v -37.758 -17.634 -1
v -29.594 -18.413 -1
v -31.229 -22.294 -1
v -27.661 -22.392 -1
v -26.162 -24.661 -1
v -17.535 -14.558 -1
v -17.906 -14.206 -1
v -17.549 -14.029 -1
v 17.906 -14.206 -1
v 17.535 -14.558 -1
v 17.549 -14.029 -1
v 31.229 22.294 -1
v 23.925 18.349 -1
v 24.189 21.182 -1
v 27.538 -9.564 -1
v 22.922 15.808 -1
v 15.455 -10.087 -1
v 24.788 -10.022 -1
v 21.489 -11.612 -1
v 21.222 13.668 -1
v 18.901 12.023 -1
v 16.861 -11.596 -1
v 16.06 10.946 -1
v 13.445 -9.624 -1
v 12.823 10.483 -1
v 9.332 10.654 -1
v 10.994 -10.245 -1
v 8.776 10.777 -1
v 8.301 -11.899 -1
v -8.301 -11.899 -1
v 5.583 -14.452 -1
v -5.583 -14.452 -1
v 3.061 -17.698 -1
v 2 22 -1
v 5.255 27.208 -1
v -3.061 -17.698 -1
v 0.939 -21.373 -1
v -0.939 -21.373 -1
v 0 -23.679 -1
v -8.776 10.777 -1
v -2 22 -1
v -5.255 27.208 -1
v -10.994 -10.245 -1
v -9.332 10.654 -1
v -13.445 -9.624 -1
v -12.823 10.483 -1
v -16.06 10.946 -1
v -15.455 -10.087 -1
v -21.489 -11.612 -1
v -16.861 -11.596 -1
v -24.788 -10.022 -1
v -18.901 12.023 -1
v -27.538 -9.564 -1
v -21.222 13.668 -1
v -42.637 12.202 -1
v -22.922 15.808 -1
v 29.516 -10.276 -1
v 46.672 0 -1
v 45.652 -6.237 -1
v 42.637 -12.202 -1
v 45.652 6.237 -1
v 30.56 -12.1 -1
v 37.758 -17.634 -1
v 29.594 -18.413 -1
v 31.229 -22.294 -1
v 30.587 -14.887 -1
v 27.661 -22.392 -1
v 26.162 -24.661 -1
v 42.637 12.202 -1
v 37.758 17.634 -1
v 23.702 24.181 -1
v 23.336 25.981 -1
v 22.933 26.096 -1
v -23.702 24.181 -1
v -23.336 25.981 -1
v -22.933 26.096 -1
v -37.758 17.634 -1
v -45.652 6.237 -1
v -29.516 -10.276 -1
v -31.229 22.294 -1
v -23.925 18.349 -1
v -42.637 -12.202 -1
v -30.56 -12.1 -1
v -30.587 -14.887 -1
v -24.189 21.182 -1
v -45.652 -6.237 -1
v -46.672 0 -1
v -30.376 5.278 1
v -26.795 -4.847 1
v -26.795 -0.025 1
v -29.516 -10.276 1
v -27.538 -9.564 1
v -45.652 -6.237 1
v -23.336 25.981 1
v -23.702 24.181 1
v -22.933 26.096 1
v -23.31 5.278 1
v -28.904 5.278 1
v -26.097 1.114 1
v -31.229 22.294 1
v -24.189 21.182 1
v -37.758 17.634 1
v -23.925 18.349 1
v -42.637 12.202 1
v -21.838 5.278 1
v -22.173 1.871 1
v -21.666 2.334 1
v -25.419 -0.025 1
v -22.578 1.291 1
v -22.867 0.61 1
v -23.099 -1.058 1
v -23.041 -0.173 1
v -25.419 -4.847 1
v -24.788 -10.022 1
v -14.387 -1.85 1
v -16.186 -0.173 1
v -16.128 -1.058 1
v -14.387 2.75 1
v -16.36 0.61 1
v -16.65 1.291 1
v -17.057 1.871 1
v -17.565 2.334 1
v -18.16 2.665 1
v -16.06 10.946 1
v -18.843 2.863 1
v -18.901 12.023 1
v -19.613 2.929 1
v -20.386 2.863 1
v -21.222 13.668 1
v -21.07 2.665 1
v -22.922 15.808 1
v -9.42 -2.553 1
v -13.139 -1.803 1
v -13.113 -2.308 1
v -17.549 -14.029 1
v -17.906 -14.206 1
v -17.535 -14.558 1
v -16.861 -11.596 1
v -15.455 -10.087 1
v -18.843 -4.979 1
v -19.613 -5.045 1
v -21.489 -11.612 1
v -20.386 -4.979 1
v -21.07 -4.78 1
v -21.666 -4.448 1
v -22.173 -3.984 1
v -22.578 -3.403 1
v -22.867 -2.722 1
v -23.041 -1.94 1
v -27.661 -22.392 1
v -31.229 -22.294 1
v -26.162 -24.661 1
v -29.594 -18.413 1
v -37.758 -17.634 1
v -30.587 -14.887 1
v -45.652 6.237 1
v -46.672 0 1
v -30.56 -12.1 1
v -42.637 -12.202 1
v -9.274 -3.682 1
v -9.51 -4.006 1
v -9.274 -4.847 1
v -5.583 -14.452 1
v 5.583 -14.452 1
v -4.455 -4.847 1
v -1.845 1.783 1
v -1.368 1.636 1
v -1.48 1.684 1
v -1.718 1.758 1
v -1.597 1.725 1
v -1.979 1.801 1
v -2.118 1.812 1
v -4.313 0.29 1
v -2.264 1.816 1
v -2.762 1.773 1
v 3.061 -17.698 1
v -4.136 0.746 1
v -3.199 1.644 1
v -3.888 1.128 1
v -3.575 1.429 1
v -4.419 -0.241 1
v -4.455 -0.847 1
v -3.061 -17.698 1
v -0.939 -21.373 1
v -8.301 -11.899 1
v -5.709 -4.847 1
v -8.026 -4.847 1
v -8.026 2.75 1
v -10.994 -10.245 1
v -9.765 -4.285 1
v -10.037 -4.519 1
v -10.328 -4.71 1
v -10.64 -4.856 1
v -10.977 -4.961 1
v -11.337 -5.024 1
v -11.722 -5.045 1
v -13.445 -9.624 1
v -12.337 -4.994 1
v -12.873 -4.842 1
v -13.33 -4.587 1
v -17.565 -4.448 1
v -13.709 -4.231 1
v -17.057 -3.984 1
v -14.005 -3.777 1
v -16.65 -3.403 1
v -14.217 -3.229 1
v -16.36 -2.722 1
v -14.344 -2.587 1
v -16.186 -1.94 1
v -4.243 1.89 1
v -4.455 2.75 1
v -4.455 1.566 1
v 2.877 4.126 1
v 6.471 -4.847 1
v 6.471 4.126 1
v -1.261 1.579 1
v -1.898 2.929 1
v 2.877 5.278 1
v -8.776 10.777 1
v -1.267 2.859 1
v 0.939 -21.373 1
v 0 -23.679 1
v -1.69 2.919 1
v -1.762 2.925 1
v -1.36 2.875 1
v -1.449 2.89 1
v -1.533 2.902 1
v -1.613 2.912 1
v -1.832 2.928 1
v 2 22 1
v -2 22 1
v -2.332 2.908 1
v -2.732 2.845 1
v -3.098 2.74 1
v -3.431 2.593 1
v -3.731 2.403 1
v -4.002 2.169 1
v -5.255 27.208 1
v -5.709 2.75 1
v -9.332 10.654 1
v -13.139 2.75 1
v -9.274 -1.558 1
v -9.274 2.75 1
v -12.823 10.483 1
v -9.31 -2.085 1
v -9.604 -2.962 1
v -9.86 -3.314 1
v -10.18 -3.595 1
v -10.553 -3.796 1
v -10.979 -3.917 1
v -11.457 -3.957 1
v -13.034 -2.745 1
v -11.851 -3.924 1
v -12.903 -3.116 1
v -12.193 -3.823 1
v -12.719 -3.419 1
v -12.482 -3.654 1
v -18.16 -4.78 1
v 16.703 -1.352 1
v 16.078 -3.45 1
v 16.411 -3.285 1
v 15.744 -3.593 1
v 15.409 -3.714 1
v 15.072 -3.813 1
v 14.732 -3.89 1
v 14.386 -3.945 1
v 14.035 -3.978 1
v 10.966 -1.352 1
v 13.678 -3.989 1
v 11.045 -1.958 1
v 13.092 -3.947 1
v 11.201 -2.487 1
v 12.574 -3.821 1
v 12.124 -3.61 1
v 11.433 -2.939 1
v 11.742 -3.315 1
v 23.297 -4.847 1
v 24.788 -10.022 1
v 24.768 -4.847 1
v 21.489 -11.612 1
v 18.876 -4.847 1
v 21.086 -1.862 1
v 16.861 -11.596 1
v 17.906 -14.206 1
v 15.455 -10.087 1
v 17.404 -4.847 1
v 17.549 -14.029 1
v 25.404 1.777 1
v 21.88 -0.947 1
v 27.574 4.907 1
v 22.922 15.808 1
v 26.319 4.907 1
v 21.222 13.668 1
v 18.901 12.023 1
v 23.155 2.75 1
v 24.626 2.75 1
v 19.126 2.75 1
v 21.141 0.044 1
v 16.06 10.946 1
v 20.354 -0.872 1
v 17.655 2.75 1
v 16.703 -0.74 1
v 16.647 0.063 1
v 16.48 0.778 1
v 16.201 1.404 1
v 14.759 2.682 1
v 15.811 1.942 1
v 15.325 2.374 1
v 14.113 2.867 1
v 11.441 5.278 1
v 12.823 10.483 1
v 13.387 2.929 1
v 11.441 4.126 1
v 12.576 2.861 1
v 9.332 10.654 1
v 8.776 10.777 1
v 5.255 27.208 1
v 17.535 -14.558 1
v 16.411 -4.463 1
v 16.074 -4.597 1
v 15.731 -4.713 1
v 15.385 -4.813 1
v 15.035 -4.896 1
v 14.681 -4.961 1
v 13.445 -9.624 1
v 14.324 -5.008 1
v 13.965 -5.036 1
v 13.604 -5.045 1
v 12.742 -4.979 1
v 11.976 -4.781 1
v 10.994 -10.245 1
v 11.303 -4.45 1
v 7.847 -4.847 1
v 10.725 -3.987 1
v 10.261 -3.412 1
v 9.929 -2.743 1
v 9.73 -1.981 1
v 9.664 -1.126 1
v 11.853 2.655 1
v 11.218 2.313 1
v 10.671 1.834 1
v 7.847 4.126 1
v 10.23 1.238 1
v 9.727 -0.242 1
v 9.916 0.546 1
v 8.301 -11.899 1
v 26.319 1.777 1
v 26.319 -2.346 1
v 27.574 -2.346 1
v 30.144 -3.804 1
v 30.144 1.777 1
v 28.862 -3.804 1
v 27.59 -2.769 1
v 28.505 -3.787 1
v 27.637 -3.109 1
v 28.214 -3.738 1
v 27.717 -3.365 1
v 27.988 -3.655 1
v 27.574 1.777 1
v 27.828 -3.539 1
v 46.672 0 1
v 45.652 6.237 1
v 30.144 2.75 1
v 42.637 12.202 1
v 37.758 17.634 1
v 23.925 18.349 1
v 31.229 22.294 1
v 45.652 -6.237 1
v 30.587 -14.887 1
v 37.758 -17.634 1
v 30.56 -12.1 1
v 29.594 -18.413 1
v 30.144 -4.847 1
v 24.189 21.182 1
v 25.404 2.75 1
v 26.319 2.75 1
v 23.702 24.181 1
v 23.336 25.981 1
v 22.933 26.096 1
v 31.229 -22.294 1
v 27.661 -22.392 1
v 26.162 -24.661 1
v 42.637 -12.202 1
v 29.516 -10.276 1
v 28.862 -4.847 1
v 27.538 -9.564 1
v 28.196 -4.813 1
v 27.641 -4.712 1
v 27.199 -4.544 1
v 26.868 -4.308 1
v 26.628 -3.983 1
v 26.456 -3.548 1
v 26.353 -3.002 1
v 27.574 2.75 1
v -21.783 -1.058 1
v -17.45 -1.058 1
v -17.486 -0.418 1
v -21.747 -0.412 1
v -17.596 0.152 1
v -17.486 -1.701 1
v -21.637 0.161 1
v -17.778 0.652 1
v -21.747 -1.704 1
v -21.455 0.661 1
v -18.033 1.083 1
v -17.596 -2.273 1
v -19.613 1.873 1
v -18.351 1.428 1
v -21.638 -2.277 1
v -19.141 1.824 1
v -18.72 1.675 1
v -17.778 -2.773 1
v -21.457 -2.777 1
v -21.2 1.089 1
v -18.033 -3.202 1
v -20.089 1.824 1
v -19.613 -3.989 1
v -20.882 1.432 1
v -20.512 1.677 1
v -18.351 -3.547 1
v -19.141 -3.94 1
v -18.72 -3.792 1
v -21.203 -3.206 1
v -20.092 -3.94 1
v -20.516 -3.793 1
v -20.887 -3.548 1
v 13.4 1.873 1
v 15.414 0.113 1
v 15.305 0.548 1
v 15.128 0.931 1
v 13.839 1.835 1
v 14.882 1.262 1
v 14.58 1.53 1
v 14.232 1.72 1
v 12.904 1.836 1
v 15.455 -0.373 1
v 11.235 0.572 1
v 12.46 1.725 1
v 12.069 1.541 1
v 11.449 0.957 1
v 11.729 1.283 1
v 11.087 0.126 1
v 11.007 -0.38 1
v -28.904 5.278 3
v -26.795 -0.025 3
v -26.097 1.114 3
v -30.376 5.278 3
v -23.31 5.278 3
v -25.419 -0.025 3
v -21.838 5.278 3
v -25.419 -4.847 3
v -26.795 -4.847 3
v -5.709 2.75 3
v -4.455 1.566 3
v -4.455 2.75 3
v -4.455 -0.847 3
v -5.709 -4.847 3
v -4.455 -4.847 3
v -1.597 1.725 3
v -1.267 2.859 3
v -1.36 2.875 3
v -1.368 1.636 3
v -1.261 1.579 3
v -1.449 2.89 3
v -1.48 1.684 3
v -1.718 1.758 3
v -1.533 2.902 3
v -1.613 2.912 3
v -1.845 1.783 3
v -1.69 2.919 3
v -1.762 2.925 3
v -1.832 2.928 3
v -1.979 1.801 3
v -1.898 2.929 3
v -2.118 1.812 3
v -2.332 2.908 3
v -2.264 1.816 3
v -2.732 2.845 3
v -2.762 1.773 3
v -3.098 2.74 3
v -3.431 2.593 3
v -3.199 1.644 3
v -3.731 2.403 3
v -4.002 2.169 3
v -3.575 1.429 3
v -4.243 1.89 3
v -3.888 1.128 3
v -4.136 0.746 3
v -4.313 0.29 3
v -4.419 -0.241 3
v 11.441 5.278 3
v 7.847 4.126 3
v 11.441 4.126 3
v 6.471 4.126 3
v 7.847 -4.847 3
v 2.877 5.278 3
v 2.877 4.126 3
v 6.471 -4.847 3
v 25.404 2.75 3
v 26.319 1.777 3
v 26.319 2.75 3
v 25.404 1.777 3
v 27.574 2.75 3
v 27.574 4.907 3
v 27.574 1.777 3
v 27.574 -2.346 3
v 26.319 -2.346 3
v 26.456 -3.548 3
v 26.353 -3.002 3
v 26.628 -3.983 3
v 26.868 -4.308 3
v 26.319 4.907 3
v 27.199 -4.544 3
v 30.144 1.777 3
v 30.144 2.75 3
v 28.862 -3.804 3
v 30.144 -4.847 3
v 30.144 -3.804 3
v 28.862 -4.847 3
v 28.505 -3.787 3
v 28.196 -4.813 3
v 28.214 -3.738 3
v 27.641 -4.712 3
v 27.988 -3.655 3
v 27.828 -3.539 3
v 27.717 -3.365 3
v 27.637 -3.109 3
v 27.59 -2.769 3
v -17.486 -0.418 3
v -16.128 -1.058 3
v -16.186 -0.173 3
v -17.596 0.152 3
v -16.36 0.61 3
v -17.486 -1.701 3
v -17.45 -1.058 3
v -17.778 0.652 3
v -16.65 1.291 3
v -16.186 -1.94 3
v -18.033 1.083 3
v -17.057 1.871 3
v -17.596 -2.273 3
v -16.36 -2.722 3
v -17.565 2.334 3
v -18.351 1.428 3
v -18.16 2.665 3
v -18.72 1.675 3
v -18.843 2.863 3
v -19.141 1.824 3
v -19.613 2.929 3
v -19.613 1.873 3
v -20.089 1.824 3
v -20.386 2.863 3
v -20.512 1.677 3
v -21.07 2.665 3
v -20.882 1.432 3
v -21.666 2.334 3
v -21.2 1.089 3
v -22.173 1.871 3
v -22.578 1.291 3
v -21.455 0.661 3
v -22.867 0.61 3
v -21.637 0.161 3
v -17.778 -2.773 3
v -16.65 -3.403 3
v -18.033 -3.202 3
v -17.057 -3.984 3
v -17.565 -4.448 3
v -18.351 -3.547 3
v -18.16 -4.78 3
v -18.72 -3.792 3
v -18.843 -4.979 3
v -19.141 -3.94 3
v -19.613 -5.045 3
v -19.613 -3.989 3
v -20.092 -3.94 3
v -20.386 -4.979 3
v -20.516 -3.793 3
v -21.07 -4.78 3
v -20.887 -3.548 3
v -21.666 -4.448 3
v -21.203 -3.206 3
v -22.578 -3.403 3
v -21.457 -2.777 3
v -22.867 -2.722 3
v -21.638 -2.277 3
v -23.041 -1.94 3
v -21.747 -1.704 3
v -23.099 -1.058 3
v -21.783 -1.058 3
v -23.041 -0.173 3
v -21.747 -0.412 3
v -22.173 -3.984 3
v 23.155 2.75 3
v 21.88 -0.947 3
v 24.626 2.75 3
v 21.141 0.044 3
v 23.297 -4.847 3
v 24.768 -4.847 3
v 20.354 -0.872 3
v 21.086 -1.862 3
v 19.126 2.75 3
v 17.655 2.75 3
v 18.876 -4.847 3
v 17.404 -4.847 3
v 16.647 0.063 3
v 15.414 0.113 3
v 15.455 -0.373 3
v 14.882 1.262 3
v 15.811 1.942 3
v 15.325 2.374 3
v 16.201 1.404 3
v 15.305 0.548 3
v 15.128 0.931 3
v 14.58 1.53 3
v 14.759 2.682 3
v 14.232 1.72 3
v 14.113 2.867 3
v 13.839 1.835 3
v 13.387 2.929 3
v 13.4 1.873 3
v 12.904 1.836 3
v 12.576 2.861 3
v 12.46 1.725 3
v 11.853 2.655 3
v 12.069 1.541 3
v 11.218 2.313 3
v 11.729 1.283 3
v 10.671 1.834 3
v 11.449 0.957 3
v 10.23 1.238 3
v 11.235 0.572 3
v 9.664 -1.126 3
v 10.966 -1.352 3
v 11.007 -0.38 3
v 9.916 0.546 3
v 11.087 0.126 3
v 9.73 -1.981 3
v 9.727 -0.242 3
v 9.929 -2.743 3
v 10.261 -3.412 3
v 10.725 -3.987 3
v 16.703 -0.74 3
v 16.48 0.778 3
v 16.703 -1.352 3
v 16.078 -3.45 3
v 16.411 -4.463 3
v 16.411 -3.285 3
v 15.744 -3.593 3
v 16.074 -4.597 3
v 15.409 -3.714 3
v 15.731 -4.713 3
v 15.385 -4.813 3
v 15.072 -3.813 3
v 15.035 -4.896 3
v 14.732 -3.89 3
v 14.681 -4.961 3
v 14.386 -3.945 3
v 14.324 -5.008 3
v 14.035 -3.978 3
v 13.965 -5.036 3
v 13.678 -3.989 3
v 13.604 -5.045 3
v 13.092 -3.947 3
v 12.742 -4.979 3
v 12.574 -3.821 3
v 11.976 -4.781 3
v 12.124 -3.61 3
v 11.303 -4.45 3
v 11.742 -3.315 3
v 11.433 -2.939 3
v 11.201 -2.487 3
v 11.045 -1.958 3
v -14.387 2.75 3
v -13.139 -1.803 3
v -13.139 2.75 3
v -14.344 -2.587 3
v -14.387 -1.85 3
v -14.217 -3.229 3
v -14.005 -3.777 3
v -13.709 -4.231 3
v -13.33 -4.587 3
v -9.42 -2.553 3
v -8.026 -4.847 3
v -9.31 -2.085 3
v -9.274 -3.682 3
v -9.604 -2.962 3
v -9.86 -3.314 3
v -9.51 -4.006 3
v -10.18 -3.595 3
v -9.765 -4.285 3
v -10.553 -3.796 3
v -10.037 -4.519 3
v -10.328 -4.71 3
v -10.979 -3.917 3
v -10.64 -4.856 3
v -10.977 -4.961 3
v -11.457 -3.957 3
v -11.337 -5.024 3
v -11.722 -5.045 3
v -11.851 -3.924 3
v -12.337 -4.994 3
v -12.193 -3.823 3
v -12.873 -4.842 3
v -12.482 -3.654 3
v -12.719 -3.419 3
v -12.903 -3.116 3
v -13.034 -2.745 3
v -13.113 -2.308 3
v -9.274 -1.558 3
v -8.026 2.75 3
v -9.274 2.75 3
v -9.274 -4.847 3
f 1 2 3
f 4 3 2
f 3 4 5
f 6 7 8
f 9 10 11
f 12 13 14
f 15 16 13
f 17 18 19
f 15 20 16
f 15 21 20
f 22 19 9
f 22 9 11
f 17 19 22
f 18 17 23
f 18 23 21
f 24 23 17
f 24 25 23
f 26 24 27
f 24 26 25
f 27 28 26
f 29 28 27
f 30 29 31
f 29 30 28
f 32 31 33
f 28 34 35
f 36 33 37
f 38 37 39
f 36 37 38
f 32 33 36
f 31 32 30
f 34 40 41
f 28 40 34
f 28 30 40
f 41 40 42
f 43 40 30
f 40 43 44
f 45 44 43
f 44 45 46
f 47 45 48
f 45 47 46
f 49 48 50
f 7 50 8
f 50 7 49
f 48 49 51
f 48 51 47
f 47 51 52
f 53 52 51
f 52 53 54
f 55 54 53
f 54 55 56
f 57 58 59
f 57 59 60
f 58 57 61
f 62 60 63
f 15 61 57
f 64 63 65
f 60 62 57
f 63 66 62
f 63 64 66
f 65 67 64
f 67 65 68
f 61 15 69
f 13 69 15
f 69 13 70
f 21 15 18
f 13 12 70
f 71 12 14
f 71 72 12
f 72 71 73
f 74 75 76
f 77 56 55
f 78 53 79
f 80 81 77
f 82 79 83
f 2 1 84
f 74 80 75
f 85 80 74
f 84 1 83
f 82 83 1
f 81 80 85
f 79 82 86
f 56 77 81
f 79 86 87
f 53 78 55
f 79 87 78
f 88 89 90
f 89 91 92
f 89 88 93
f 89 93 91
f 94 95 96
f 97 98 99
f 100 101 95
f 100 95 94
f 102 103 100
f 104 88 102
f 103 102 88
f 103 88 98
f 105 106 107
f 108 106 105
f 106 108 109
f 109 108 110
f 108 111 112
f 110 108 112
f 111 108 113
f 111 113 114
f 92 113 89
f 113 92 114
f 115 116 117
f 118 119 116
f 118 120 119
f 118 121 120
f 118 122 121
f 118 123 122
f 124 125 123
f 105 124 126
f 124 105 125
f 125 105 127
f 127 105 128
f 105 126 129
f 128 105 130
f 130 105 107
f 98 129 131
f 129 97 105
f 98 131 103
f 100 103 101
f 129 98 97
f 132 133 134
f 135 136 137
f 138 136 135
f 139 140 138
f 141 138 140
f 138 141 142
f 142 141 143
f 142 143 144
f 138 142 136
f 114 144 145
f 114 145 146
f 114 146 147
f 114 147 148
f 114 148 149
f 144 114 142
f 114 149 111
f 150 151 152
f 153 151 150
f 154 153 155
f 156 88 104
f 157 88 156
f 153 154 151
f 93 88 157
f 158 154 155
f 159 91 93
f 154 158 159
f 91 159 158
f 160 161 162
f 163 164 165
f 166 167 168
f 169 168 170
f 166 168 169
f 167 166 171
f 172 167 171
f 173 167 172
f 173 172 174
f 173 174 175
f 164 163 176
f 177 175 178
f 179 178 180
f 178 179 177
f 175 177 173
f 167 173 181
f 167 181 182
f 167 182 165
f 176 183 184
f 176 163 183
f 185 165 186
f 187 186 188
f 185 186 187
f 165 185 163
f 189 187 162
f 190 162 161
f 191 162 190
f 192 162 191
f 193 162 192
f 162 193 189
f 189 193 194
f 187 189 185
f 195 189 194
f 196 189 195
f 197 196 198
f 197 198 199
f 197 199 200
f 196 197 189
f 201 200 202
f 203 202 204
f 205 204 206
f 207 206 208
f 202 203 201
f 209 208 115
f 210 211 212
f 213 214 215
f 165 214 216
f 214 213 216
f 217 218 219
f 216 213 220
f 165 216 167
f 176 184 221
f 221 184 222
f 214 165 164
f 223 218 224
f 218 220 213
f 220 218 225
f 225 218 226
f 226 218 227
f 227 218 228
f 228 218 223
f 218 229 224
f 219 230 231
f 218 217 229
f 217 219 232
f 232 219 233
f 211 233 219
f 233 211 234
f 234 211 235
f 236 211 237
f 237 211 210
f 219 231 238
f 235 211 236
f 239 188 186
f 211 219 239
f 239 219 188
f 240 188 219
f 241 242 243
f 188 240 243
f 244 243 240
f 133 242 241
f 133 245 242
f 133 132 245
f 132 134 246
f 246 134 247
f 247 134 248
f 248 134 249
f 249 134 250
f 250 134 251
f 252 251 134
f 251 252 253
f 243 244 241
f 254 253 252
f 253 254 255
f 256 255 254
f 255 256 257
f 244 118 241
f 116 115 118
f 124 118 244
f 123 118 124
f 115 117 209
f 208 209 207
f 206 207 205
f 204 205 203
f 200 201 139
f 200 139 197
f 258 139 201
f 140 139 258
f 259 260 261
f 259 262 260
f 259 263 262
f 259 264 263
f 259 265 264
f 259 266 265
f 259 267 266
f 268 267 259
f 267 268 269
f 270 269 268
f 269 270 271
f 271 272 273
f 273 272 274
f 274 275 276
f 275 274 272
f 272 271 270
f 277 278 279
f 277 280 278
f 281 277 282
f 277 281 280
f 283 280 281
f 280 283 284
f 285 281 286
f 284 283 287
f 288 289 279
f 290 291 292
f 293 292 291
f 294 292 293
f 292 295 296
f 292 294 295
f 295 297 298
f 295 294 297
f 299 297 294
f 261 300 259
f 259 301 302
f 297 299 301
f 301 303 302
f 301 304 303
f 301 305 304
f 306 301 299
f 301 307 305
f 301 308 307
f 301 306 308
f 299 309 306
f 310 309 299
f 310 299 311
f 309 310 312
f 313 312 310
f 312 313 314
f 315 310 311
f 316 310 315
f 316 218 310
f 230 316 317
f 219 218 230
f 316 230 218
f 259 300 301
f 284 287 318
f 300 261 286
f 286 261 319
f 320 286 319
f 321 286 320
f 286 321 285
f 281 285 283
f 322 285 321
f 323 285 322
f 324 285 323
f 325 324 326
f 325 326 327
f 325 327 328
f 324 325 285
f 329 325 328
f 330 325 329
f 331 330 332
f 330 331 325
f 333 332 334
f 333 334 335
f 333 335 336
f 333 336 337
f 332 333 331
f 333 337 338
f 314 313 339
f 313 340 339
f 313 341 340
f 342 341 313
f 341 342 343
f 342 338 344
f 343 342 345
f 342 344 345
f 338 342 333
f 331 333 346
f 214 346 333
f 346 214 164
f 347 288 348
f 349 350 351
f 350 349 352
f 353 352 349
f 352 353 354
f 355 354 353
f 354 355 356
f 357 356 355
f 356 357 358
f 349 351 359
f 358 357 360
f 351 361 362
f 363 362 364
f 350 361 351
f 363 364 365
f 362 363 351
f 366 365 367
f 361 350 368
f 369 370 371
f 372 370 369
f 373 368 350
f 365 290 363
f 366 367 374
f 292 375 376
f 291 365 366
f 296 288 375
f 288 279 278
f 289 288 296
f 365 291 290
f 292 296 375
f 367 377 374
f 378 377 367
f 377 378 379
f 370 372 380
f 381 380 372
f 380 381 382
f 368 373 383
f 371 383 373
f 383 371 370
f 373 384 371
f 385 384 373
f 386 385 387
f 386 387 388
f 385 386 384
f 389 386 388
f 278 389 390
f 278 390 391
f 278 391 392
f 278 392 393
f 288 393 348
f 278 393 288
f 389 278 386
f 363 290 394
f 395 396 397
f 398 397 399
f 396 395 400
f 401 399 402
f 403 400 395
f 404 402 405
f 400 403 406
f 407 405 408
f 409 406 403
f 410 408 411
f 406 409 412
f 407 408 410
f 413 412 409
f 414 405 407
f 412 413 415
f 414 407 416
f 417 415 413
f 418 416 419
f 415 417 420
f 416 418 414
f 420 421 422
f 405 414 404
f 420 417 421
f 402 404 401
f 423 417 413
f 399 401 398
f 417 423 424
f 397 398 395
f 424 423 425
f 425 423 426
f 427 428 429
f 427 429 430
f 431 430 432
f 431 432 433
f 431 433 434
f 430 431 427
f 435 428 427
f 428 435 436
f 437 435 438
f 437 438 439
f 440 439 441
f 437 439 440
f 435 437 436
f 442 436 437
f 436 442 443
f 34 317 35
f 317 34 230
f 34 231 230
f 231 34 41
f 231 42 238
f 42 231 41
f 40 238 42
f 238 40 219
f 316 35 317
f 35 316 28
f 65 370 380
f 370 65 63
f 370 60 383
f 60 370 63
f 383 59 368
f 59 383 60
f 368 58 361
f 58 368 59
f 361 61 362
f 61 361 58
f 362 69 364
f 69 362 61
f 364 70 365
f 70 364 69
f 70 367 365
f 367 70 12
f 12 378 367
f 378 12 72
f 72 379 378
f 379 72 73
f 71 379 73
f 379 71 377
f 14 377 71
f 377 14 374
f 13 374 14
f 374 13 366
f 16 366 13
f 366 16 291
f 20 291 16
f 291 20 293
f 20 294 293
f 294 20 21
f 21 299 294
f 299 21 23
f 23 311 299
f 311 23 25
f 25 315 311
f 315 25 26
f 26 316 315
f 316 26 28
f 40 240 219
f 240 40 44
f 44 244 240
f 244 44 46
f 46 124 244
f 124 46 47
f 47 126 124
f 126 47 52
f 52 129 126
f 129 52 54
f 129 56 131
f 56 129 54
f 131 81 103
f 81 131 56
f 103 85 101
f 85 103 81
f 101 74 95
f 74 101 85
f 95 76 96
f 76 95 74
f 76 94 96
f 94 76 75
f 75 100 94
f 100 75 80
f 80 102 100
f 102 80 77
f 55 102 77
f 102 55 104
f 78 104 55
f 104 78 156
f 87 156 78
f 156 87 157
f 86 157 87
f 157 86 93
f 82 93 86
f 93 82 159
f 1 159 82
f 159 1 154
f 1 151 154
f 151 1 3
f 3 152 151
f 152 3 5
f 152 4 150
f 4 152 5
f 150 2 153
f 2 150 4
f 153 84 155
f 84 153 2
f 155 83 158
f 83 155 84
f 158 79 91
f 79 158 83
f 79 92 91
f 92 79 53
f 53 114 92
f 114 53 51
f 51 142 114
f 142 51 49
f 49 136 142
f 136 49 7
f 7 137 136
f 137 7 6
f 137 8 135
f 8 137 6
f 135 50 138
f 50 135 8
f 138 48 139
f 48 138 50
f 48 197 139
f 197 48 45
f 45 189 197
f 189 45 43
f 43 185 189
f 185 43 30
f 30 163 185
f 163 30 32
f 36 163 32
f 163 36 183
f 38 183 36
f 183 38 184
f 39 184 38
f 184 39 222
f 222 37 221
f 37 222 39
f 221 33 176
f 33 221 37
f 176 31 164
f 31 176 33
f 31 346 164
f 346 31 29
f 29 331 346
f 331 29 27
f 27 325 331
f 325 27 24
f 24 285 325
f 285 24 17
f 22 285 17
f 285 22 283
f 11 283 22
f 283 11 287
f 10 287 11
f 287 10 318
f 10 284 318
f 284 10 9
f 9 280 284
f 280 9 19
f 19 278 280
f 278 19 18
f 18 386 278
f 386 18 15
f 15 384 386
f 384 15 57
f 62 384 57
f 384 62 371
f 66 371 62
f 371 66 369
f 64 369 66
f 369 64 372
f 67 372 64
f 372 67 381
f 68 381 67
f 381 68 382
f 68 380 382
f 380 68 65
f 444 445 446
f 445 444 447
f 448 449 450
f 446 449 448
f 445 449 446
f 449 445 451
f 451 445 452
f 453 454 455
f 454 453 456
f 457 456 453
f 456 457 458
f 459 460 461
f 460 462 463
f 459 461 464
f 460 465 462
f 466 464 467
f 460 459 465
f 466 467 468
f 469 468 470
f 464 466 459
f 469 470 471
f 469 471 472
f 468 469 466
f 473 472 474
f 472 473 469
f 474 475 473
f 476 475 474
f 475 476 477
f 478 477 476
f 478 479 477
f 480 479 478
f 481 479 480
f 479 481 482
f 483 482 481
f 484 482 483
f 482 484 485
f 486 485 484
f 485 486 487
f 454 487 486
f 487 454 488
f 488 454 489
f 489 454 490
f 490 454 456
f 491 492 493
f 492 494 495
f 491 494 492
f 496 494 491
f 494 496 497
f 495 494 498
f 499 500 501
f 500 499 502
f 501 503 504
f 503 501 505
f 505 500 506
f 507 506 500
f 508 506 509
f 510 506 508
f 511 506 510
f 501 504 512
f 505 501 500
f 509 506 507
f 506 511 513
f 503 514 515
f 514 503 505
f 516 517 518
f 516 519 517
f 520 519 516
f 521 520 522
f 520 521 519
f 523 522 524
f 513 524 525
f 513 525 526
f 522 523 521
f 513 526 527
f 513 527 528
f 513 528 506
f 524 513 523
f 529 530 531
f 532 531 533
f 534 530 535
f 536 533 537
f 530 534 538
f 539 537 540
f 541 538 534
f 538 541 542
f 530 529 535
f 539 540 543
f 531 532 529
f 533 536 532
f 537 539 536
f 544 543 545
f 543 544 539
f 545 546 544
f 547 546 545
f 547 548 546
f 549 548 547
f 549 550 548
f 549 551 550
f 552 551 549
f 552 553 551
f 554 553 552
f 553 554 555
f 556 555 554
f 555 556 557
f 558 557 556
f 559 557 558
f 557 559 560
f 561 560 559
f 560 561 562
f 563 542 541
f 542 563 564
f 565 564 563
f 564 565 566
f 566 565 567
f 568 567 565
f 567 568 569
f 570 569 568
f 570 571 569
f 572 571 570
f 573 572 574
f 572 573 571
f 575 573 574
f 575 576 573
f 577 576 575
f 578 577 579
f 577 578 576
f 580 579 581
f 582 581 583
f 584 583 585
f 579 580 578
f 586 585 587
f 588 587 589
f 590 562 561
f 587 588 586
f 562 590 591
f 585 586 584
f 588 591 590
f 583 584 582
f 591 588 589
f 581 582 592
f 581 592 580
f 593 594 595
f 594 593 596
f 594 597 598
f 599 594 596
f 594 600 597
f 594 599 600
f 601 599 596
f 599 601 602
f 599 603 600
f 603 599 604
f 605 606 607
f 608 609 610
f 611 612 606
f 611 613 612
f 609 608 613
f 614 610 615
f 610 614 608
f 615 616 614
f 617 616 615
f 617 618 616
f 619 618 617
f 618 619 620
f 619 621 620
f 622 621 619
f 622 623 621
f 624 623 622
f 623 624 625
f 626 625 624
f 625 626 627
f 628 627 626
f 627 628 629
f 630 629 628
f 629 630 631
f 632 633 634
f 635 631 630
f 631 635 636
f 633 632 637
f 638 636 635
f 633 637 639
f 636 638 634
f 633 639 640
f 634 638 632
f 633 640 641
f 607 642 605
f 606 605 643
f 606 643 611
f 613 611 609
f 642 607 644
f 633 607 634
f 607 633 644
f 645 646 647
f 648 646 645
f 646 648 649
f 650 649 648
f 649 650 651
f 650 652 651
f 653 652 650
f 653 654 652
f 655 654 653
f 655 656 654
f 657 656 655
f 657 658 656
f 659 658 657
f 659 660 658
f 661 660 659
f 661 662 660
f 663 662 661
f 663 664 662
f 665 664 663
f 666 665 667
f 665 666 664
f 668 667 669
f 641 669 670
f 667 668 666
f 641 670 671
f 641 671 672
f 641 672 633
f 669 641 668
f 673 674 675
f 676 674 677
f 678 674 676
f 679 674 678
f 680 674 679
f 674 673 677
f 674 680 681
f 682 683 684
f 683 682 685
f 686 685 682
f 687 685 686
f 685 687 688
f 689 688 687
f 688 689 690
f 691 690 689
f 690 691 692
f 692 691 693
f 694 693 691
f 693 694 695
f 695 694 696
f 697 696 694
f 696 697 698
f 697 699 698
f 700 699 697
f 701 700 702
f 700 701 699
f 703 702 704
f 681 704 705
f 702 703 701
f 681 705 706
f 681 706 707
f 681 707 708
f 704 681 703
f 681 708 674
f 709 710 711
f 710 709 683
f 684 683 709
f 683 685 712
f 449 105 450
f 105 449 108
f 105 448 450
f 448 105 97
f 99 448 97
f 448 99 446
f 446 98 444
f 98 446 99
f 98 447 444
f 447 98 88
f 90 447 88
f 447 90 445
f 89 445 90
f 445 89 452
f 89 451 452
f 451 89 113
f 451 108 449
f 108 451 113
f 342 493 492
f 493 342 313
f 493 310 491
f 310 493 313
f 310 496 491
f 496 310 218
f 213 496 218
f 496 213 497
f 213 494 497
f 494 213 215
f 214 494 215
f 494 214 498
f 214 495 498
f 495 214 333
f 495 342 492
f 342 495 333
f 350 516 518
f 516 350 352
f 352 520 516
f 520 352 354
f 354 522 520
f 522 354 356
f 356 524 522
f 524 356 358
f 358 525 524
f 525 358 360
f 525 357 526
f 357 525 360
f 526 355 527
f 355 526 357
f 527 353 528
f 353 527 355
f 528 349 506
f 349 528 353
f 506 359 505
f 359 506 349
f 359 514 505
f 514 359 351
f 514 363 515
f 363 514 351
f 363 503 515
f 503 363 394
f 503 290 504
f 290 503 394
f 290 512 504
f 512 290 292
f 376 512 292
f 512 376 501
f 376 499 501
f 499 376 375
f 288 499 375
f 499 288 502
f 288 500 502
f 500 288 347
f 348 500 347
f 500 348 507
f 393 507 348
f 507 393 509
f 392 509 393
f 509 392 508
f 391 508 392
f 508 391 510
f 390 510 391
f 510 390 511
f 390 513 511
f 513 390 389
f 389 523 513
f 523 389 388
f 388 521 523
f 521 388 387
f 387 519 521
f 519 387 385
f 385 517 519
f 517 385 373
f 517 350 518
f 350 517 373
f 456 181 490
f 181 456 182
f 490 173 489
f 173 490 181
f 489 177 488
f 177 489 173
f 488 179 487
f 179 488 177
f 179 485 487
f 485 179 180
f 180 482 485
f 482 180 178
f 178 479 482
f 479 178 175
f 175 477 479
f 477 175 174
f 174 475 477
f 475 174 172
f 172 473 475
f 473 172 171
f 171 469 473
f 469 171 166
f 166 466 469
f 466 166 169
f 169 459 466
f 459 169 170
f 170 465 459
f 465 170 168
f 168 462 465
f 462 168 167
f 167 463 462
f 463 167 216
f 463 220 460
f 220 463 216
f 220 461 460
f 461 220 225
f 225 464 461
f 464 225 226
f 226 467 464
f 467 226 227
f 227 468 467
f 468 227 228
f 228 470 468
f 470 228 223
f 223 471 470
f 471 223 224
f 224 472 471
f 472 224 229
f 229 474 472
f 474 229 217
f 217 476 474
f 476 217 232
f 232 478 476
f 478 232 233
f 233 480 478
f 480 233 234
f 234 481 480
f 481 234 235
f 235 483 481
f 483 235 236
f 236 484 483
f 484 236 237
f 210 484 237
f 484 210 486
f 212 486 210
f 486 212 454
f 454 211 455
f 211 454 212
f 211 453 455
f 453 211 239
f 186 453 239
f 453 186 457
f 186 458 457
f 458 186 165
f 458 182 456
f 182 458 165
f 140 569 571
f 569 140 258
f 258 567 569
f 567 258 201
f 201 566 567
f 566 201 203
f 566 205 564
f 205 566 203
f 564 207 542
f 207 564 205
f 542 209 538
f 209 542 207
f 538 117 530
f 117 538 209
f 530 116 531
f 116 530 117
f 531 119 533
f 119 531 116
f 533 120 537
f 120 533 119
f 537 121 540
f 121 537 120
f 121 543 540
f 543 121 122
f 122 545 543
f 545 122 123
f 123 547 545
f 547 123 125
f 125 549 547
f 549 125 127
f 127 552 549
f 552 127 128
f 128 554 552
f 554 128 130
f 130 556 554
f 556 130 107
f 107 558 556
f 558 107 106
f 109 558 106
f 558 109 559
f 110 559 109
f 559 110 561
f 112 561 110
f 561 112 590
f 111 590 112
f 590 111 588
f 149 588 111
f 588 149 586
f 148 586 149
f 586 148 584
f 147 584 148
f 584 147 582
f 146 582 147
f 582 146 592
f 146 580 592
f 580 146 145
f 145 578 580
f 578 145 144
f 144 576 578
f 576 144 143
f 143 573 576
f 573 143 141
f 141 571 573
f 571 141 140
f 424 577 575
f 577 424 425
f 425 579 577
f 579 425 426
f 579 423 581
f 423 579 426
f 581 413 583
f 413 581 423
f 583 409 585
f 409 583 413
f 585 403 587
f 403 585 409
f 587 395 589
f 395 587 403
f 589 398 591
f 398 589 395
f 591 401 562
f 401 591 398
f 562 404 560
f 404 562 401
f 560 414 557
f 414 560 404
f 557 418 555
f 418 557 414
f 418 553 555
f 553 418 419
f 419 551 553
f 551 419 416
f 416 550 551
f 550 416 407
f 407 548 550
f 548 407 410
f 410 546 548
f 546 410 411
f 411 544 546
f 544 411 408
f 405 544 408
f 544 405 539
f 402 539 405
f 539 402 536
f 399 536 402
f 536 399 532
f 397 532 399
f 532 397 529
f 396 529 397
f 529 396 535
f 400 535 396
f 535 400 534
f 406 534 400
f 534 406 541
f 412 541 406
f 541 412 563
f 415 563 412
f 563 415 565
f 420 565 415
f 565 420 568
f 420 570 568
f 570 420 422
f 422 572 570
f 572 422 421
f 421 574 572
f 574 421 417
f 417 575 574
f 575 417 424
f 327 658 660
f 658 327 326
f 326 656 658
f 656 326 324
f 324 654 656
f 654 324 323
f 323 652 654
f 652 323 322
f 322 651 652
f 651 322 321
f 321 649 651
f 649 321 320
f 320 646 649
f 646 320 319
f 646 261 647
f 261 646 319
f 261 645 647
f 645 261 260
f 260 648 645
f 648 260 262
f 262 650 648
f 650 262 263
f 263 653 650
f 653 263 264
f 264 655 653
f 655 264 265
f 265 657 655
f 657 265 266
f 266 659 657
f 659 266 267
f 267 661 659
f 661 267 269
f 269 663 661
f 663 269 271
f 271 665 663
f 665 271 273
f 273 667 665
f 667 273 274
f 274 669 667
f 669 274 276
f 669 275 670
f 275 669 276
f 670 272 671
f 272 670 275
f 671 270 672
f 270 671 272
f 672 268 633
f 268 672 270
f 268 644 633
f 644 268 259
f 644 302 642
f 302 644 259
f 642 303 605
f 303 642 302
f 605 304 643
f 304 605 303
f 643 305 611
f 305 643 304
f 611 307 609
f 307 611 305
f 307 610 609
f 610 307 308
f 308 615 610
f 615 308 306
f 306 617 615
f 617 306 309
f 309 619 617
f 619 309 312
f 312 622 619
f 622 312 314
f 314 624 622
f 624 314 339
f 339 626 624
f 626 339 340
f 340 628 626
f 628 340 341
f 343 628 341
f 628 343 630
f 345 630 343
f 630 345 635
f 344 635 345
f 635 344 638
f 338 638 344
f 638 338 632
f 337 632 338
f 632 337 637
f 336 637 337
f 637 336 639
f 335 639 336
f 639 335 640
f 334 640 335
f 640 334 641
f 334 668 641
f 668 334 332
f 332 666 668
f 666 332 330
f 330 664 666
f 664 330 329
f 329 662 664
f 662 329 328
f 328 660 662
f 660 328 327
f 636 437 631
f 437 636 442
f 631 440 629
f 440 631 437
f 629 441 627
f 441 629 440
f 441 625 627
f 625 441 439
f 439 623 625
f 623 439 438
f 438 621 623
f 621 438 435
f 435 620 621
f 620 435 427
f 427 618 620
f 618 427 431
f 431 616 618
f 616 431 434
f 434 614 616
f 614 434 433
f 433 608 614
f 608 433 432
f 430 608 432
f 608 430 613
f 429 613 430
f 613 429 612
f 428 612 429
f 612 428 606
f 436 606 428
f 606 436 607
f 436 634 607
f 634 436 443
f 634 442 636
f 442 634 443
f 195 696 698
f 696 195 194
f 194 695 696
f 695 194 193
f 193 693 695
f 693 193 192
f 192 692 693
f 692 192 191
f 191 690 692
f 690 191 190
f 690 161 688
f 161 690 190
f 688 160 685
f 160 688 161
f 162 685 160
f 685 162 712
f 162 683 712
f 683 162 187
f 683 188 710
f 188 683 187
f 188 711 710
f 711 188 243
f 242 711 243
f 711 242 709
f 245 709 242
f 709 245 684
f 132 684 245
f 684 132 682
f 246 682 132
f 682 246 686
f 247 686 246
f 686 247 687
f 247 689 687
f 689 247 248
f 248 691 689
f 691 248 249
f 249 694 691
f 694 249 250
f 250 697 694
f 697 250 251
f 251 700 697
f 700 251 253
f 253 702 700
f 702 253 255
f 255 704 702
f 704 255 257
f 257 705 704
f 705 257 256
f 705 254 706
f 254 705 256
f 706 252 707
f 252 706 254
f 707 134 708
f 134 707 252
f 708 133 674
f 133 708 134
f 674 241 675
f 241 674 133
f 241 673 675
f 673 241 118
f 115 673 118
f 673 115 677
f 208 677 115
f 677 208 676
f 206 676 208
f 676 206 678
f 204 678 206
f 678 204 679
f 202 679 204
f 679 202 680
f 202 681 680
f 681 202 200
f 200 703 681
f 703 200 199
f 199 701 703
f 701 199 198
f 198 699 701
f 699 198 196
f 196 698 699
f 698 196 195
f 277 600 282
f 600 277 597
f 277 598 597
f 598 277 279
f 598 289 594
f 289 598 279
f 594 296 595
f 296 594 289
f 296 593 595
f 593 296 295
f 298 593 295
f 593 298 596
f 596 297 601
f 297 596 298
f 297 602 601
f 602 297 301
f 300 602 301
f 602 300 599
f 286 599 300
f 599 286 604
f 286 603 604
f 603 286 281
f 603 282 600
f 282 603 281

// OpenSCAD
/* [Text] */
//height above base
textHeight = 3; // [1,2,3,4,5]
//text size
textSize = 10; // [3:35] 
// font for text
myFont = "Bernard MT Condensed";
//text to put on plate
textInput = "Your Text";

color([0.15,0.15,0.15])
linear_extrude(height = 2, center = true, convexity = 10, twist = 0)
difference(){

translate([0,20,0])
polygon(points=[[-9.8, -14], [9.8,-14],[3.8, 14],[-3.8, 14] ],paths=[[0,1,2,3]], convexity=10);

translate([0,30,0])
polygon(points=[[-2, -8], [2,-8],[12, 8],[-12, 8] ],paths=[[0,1,2,3]], convexity=10);
}

color([0.15,0.15,0.15])
linear_extrude(height = 2, center = true, convexity = 10, twist = 0)
difference(){

projection(cut=true) 
rotate([0,50,0])
cylinder(r=30, h=200, center=true);

translate([-8,-23,0]) 
rotate([0,0,-60])
projection(cut=true)
rotate([0,62,0])
cylinder(r=7, h=200, center=true);

translate([8,-23,0]) 
rotate([0,0,60])
projection(cut=true)
rotate([0,62,0])
cylinder(r=7, h=200, center=true);

translate([-18,-24,0]) 
rotate([0,0,-50])
projection(cut=true)
rotate([0,67,0])
cylinder(r=7, h=200, center=true);

translate([18,-24,0]) 
rotate([0,0,50])
projection(cut=true)
rotate([0,67,0])
cylinder(r=7, h=200, center=true);

union(){

translate([-7,25,0]) 
rotate([0,0,30])
projection(cut=true)
rotate([0,45,0])
cylinder(r=13, h=200, center=true);

translate([7,25,0]) 
rotate([0,0,-30])
projection(cut=true)
rotate([0,45,0])
cylinder(r=13, h=200, center=true);
}

}

module textExtrude(){
    
    linear_extrude(height = textHeight) text(textInput, halign = "center", valign = "center", size = textSize, font = myFont);
    
     
    
}
textExtrude();
